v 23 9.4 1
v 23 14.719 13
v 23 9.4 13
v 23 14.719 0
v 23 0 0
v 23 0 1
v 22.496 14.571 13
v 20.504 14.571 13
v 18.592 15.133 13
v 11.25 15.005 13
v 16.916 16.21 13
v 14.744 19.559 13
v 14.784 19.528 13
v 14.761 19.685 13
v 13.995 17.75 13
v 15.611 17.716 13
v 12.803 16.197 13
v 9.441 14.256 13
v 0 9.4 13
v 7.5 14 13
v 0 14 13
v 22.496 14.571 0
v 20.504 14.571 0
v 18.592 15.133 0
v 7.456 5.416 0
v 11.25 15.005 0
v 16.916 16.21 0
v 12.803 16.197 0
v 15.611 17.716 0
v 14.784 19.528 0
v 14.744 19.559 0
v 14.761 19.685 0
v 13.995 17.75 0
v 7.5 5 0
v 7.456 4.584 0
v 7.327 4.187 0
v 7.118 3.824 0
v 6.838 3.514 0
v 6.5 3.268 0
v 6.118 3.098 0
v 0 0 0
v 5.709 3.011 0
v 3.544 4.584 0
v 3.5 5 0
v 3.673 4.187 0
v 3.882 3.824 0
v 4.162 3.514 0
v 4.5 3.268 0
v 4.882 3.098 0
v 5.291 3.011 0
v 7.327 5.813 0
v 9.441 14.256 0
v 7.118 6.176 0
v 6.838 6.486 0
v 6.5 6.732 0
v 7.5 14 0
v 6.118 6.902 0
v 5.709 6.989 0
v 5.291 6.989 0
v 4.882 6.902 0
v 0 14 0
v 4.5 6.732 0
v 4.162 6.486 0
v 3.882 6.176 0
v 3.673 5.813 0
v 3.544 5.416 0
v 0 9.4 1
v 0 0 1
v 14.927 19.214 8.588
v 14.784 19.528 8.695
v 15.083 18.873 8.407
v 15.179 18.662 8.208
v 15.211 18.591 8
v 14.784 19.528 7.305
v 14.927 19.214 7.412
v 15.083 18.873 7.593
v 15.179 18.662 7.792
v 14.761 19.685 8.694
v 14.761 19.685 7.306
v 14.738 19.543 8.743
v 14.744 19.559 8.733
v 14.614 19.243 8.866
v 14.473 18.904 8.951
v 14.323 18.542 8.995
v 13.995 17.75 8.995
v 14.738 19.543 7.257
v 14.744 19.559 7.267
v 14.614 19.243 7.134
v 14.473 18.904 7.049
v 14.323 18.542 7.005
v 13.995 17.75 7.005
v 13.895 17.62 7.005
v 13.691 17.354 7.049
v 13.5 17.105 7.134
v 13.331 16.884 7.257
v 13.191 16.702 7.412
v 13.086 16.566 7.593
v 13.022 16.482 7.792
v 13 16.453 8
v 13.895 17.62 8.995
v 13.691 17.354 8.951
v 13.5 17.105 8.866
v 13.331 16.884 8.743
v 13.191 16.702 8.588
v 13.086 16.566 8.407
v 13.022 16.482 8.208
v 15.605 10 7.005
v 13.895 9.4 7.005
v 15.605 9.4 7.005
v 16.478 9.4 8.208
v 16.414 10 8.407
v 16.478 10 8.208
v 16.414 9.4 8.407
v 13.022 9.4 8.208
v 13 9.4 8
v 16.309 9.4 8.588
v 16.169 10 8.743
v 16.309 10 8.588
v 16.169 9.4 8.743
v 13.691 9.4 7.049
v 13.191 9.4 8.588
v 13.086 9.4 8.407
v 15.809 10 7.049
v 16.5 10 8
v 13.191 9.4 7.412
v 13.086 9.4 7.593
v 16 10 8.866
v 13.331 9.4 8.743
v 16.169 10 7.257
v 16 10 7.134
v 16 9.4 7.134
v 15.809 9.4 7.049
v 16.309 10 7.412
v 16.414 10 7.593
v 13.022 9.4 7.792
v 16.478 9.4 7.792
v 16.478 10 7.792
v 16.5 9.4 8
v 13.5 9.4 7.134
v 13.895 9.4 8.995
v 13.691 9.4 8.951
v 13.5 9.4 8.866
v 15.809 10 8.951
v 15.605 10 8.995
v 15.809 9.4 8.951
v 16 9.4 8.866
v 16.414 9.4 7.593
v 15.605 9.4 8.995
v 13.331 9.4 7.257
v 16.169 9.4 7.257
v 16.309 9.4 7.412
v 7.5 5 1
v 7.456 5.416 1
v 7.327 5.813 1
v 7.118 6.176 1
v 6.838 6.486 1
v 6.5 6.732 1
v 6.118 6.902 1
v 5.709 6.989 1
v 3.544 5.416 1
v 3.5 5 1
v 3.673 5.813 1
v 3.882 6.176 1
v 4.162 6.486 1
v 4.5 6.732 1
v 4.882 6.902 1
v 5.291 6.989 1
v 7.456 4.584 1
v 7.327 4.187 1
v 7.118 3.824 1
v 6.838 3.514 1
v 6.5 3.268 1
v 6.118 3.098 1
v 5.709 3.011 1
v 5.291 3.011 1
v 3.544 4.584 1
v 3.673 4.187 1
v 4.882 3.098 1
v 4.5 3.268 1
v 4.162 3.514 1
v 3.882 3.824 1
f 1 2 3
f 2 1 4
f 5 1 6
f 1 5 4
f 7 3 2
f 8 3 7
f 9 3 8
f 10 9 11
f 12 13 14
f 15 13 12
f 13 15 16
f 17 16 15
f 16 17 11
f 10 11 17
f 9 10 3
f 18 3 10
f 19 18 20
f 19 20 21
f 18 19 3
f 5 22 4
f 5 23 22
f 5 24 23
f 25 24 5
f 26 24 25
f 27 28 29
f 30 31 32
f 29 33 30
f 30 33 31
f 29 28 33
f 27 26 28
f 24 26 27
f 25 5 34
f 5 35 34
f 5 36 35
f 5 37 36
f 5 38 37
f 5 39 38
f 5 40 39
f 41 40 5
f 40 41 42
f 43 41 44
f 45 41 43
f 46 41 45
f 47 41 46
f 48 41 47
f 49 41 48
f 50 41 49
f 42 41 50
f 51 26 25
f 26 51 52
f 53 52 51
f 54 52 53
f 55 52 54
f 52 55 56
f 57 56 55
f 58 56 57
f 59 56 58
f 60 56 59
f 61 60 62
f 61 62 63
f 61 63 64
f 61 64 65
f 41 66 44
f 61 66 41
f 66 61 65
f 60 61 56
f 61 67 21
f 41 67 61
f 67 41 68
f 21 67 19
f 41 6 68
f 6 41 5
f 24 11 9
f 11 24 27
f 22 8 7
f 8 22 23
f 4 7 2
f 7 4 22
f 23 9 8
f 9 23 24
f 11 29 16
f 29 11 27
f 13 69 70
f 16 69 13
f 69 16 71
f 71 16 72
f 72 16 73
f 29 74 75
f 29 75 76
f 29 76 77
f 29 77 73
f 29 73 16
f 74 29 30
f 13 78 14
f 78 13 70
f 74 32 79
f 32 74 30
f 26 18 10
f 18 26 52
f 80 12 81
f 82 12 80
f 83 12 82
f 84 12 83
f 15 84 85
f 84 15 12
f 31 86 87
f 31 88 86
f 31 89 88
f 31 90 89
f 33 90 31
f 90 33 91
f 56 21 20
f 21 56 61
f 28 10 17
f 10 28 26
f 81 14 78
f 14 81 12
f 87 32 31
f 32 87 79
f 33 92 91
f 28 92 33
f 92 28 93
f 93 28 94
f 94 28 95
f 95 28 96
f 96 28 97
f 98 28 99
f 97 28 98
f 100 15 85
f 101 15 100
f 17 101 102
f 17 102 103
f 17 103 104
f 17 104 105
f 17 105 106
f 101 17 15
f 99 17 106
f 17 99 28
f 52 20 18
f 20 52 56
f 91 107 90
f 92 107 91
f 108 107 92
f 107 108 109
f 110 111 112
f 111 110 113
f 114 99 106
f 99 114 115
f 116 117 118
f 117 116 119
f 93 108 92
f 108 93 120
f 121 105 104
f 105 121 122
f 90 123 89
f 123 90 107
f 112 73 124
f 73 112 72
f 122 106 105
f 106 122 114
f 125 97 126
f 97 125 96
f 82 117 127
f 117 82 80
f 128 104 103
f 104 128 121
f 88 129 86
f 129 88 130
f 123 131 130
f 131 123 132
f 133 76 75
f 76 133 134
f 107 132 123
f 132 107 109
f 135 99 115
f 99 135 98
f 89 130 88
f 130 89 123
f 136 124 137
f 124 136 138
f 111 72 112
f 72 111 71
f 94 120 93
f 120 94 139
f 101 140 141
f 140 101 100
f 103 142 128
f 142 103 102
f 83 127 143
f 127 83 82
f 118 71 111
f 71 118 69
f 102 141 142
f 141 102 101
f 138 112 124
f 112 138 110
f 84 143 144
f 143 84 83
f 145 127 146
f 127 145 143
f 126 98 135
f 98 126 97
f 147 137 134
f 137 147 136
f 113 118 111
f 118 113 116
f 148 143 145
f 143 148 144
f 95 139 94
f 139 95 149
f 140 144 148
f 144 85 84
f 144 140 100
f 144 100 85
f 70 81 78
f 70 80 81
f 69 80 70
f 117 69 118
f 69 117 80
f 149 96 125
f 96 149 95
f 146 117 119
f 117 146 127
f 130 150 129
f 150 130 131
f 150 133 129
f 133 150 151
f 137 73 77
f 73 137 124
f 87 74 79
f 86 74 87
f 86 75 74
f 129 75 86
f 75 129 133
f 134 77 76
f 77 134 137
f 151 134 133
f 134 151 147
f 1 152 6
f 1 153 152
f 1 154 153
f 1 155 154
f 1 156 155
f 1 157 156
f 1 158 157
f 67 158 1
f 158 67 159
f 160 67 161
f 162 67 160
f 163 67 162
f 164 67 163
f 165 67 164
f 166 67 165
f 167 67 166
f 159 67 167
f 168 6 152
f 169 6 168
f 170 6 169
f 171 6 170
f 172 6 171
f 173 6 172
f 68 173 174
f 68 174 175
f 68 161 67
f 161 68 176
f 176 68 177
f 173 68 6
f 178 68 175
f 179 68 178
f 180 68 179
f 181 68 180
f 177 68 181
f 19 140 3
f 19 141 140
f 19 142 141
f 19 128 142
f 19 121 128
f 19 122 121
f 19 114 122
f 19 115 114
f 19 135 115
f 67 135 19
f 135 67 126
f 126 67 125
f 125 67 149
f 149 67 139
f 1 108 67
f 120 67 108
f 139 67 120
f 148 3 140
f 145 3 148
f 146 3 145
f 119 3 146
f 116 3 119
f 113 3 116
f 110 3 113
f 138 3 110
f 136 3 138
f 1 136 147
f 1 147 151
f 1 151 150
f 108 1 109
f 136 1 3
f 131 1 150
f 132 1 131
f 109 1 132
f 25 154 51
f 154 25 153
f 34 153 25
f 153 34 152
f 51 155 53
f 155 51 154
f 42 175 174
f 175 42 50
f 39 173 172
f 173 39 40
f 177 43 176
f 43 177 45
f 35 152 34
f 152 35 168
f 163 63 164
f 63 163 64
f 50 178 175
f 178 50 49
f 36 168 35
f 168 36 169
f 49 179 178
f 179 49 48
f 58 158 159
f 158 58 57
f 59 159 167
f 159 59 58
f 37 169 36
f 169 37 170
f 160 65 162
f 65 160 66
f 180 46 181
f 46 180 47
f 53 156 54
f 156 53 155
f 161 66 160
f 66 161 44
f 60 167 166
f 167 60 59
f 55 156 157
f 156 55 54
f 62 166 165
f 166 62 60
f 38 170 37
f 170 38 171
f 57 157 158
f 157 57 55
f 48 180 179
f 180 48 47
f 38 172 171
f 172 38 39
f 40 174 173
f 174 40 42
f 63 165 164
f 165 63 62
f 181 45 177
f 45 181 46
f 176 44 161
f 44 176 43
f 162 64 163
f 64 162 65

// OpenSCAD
x = 23;
y = 21.5;
z = 13;

mk_gear_d = 12 +2;
bearing_d = 13+2;
filament_d = 2;
screw_d = 4;

trim = 2.5;
difference() {
    cube([x,y,z]);
    
    //mk gear
    translate([24-trim,y,-1]) cylinder(d=mk_gear_d,h = z*2);
    //bearing
    hull(){
        translate([10-trim,y,-1]) cylinder(d=bearing_d,h = z*2);
        translate([0,y,-1]) cylinder(d=bearing_d,h = z*2);
    }
    
    //filament
    hull(){
        translate([6+8,10,8]) rotate([90,0,0]) cylinder(d=filament_d,h = 1, $fn=30);
        translate([6+9.5,10,8]) rotate([90,0,0]) cylinder(d=filament_d,h = 1, $fn=30);
        
        translate([6+8,20,8]) rotate([90,0,0]) cylinder(d=filament_d,h = 1, $fn=30);
    }
    // mount block
    translate([0,0,1])cube([42,9.4, 12]);
    
    // screw
    translate([5.5,5,-1]) cylinder(d=screw_d,h = z*2, $fn=30);
}
